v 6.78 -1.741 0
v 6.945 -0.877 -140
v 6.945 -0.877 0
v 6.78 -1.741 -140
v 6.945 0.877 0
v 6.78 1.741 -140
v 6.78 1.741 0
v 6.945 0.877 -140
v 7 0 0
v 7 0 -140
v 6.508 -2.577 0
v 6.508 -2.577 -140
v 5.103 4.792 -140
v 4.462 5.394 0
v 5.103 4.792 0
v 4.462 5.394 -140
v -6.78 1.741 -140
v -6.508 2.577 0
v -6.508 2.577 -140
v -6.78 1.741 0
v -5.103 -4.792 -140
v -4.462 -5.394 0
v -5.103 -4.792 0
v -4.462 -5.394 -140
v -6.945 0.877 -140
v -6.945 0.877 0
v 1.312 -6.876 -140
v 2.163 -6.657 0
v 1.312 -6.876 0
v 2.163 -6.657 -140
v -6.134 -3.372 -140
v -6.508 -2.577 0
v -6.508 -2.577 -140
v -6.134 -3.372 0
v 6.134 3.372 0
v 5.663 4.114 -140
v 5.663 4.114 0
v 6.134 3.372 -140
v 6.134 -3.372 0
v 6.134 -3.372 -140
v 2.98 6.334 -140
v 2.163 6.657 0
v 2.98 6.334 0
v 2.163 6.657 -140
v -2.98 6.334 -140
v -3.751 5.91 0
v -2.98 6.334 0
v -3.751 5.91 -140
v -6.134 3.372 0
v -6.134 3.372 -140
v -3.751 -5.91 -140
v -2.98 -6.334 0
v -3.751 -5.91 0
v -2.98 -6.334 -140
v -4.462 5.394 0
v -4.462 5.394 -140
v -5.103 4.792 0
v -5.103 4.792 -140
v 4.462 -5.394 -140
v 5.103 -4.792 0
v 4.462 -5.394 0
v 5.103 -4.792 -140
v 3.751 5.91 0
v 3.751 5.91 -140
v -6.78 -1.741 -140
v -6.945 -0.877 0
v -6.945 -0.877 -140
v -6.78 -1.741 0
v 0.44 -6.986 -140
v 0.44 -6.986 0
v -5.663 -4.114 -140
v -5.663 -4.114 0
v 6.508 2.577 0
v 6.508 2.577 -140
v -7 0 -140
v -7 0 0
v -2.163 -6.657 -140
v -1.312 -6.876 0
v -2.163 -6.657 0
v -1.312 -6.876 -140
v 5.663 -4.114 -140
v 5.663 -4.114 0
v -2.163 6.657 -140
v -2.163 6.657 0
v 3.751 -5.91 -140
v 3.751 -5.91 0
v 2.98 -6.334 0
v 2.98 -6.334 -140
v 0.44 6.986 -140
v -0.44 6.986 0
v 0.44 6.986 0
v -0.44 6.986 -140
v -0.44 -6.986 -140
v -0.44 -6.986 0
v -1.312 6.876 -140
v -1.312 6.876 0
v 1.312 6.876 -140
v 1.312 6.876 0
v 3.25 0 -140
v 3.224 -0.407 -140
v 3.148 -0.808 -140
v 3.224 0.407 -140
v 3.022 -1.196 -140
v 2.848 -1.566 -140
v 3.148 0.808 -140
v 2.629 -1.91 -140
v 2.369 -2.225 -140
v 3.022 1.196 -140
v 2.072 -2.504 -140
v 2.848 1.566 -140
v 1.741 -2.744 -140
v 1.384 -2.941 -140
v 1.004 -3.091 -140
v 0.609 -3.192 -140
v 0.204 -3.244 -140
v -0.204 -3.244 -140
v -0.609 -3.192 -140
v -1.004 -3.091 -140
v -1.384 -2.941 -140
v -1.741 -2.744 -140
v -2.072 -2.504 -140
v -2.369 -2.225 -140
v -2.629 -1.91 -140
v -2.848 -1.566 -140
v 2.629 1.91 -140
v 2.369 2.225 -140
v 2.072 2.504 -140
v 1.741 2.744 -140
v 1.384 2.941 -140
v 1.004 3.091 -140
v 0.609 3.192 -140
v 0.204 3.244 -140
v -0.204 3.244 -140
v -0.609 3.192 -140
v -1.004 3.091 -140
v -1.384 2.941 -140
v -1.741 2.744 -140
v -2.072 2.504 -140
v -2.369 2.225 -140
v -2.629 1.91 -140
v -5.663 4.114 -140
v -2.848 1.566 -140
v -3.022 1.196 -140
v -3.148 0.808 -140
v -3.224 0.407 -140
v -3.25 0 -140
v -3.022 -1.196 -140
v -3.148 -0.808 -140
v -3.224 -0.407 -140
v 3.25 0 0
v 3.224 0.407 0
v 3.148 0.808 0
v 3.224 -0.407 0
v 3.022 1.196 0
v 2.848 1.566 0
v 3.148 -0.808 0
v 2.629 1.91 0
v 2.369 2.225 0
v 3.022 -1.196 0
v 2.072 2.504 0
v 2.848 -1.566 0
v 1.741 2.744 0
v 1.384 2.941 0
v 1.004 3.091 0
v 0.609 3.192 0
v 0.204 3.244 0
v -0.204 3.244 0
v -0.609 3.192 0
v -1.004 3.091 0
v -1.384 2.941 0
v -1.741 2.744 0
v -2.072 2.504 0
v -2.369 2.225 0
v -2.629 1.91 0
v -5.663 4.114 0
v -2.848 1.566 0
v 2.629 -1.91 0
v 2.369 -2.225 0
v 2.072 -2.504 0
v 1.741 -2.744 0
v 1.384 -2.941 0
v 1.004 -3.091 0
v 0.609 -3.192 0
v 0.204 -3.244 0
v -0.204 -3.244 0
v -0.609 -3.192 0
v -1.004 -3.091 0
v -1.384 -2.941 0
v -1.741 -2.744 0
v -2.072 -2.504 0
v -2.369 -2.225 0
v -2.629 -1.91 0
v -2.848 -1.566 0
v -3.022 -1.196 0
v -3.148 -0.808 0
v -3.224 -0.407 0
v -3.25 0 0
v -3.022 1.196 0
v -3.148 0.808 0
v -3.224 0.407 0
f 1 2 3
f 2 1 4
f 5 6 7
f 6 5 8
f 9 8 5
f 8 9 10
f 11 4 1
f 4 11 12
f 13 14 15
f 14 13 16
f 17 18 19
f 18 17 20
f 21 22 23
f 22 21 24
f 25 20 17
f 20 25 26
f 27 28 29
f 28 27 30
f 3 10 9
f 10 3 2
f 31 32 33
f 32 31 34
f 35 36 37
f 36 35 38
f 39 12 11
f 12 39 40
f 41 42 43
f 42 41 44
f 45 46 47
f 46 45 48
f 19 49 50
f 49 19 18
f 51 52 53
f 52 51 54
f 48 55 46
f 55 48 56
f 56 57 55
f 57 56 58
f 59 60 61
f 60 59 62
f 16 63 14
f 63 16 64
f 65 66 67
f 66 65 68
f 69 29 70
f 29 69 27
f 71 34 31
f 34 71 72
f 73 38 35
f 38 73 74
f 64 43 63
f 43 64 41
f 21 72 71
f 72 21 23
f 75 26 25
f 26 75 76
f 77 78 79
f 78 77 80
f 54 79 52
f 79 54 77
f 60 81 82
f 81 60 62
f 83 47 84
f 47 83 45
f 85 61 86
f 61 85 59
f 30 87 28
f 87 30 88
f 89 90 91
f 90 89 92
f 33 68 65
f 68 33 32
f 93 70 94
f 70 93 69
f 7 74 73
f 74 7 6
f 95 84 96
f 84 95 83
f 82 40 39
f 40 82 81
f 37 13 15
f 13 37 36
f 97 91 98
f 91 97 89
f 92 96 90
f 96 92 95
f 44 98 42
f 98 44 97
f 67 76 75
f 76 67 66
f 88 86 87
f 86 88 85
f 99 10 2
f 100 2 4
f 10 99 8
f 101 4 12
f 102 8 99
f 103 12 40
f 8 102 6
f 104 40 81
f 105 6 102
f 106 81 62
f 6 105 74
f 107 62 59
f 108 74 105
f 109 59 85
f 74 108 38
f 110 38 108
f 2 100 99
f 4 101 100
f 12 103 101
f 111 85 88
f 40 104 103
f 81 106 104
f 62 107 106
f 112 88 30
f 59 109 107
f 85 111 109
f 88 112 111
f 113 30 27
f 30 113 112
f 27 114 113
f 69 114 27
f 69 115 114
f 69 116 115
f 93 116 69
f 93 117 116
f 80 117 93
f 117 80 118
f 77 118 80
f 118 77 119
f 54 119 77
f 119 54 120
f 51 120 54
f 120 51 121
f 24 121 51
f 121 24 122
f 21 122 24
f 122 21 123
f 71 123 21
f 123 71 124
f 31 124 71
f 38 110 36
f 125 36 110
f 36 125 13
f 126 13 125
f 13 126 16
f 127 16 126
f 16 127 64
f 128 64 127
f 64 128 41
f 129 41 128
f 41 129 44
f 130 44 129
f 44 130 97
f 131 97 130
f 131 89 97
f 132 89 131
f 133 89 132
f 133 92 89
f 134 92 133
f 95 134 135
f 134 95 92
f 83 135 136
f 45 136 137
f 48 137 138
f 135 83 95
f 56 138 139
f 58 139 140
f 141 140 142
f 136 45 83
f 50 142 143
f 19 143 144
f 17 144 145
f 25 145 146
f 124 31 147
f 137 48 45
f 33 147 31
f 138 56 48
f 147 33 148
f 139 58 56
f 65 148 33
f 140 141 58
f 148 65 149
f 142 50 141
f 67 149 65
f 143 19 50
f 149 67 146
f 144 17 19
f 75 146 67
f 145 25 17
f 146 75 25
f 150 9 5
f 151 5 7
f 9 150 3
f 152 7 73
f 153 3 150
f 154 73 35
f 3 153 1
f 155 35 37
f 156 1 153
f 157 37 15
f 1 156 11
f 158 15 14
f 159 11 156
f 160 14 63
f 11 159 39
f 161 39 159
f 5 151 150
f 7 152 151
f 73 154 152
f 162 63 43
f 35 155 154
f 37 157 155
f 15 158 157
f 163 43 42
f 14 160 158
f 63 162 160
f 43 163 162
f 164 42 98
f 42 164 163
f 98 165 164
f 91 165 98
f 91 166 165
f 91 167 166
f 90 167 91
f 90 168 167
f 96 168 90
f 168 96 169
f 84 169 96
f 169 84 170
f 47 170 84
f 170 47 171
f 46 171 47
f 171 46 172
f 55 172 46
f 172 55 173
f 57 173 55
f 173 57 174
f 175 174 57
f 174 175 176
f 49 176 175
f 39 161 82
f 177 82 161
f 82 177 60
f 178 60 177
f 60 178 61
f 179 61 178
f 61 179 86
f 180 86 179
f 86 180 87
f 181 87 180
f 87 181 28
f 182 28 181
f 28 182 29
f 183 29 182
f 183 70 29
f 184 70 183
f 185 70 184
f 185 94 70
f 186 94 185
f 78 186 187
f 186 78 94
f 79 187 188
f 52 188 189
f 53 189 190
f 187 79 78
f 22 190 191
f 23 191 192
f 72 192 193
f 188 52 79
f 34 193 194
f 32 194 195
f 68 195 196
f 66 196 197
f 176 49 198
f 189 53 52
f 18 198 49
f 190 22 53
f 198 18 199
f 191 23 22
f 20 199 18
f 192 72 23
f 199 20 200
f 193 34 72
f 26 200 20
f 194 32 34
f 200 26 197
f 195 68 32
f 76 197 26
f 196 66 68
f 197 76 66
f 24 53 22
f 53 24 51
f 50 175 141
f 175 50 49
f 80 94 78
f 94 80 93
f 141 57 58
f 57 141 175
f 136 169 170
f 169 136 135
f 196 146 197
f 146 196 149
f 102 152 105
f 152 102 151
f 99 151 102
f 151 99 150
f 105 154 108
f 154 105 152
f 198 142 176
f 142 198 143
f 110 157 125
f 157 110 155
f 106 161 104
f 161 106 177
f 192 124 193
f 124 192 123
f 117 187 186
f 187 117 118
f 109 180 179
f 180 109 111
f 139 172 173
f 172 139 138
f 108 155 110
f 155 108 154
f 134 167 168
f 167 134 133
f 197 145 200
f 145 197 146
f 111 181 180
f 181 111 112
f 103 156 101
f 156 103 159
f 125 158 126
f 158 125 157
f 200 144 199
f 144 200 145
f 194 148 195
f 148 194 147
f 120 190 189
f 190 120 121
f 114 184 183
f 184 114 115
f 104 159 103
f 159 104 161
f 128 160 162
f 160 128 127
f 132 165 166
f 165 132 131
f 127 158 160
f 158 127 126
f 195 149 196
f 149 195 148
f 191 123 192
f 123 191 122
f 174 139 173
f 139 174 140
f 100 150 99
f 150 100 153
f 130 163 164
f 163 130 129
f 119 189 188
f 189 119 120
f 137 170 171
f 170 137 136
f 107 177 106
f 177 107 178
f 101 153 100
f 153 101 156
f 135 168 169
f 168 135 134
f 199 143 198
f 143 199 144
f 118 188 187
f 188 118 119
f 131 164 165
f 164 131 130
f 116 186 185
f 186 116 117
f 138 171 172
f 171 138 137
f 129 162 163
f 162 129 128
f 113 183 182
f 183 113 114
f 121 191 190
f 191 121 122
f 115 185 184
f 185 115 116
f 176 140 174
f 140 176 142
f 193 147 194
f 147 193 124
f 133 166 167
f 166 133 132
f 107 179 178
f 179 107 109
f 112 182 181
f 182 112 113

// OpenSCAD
$fn = 50;


difference() {
	union() {
		translate(v = [0, 0, -140.0000000000]) {
			cylinder(h = 140, r = 7.0000000000);
		}
		cylinder(h = 0, r = 10.0000000000);
	}
	union() {
		#translate(v = [0, 0, -140]) {
			cylinder(h = 140, r = 3.2500000000);
		}
	}
}
